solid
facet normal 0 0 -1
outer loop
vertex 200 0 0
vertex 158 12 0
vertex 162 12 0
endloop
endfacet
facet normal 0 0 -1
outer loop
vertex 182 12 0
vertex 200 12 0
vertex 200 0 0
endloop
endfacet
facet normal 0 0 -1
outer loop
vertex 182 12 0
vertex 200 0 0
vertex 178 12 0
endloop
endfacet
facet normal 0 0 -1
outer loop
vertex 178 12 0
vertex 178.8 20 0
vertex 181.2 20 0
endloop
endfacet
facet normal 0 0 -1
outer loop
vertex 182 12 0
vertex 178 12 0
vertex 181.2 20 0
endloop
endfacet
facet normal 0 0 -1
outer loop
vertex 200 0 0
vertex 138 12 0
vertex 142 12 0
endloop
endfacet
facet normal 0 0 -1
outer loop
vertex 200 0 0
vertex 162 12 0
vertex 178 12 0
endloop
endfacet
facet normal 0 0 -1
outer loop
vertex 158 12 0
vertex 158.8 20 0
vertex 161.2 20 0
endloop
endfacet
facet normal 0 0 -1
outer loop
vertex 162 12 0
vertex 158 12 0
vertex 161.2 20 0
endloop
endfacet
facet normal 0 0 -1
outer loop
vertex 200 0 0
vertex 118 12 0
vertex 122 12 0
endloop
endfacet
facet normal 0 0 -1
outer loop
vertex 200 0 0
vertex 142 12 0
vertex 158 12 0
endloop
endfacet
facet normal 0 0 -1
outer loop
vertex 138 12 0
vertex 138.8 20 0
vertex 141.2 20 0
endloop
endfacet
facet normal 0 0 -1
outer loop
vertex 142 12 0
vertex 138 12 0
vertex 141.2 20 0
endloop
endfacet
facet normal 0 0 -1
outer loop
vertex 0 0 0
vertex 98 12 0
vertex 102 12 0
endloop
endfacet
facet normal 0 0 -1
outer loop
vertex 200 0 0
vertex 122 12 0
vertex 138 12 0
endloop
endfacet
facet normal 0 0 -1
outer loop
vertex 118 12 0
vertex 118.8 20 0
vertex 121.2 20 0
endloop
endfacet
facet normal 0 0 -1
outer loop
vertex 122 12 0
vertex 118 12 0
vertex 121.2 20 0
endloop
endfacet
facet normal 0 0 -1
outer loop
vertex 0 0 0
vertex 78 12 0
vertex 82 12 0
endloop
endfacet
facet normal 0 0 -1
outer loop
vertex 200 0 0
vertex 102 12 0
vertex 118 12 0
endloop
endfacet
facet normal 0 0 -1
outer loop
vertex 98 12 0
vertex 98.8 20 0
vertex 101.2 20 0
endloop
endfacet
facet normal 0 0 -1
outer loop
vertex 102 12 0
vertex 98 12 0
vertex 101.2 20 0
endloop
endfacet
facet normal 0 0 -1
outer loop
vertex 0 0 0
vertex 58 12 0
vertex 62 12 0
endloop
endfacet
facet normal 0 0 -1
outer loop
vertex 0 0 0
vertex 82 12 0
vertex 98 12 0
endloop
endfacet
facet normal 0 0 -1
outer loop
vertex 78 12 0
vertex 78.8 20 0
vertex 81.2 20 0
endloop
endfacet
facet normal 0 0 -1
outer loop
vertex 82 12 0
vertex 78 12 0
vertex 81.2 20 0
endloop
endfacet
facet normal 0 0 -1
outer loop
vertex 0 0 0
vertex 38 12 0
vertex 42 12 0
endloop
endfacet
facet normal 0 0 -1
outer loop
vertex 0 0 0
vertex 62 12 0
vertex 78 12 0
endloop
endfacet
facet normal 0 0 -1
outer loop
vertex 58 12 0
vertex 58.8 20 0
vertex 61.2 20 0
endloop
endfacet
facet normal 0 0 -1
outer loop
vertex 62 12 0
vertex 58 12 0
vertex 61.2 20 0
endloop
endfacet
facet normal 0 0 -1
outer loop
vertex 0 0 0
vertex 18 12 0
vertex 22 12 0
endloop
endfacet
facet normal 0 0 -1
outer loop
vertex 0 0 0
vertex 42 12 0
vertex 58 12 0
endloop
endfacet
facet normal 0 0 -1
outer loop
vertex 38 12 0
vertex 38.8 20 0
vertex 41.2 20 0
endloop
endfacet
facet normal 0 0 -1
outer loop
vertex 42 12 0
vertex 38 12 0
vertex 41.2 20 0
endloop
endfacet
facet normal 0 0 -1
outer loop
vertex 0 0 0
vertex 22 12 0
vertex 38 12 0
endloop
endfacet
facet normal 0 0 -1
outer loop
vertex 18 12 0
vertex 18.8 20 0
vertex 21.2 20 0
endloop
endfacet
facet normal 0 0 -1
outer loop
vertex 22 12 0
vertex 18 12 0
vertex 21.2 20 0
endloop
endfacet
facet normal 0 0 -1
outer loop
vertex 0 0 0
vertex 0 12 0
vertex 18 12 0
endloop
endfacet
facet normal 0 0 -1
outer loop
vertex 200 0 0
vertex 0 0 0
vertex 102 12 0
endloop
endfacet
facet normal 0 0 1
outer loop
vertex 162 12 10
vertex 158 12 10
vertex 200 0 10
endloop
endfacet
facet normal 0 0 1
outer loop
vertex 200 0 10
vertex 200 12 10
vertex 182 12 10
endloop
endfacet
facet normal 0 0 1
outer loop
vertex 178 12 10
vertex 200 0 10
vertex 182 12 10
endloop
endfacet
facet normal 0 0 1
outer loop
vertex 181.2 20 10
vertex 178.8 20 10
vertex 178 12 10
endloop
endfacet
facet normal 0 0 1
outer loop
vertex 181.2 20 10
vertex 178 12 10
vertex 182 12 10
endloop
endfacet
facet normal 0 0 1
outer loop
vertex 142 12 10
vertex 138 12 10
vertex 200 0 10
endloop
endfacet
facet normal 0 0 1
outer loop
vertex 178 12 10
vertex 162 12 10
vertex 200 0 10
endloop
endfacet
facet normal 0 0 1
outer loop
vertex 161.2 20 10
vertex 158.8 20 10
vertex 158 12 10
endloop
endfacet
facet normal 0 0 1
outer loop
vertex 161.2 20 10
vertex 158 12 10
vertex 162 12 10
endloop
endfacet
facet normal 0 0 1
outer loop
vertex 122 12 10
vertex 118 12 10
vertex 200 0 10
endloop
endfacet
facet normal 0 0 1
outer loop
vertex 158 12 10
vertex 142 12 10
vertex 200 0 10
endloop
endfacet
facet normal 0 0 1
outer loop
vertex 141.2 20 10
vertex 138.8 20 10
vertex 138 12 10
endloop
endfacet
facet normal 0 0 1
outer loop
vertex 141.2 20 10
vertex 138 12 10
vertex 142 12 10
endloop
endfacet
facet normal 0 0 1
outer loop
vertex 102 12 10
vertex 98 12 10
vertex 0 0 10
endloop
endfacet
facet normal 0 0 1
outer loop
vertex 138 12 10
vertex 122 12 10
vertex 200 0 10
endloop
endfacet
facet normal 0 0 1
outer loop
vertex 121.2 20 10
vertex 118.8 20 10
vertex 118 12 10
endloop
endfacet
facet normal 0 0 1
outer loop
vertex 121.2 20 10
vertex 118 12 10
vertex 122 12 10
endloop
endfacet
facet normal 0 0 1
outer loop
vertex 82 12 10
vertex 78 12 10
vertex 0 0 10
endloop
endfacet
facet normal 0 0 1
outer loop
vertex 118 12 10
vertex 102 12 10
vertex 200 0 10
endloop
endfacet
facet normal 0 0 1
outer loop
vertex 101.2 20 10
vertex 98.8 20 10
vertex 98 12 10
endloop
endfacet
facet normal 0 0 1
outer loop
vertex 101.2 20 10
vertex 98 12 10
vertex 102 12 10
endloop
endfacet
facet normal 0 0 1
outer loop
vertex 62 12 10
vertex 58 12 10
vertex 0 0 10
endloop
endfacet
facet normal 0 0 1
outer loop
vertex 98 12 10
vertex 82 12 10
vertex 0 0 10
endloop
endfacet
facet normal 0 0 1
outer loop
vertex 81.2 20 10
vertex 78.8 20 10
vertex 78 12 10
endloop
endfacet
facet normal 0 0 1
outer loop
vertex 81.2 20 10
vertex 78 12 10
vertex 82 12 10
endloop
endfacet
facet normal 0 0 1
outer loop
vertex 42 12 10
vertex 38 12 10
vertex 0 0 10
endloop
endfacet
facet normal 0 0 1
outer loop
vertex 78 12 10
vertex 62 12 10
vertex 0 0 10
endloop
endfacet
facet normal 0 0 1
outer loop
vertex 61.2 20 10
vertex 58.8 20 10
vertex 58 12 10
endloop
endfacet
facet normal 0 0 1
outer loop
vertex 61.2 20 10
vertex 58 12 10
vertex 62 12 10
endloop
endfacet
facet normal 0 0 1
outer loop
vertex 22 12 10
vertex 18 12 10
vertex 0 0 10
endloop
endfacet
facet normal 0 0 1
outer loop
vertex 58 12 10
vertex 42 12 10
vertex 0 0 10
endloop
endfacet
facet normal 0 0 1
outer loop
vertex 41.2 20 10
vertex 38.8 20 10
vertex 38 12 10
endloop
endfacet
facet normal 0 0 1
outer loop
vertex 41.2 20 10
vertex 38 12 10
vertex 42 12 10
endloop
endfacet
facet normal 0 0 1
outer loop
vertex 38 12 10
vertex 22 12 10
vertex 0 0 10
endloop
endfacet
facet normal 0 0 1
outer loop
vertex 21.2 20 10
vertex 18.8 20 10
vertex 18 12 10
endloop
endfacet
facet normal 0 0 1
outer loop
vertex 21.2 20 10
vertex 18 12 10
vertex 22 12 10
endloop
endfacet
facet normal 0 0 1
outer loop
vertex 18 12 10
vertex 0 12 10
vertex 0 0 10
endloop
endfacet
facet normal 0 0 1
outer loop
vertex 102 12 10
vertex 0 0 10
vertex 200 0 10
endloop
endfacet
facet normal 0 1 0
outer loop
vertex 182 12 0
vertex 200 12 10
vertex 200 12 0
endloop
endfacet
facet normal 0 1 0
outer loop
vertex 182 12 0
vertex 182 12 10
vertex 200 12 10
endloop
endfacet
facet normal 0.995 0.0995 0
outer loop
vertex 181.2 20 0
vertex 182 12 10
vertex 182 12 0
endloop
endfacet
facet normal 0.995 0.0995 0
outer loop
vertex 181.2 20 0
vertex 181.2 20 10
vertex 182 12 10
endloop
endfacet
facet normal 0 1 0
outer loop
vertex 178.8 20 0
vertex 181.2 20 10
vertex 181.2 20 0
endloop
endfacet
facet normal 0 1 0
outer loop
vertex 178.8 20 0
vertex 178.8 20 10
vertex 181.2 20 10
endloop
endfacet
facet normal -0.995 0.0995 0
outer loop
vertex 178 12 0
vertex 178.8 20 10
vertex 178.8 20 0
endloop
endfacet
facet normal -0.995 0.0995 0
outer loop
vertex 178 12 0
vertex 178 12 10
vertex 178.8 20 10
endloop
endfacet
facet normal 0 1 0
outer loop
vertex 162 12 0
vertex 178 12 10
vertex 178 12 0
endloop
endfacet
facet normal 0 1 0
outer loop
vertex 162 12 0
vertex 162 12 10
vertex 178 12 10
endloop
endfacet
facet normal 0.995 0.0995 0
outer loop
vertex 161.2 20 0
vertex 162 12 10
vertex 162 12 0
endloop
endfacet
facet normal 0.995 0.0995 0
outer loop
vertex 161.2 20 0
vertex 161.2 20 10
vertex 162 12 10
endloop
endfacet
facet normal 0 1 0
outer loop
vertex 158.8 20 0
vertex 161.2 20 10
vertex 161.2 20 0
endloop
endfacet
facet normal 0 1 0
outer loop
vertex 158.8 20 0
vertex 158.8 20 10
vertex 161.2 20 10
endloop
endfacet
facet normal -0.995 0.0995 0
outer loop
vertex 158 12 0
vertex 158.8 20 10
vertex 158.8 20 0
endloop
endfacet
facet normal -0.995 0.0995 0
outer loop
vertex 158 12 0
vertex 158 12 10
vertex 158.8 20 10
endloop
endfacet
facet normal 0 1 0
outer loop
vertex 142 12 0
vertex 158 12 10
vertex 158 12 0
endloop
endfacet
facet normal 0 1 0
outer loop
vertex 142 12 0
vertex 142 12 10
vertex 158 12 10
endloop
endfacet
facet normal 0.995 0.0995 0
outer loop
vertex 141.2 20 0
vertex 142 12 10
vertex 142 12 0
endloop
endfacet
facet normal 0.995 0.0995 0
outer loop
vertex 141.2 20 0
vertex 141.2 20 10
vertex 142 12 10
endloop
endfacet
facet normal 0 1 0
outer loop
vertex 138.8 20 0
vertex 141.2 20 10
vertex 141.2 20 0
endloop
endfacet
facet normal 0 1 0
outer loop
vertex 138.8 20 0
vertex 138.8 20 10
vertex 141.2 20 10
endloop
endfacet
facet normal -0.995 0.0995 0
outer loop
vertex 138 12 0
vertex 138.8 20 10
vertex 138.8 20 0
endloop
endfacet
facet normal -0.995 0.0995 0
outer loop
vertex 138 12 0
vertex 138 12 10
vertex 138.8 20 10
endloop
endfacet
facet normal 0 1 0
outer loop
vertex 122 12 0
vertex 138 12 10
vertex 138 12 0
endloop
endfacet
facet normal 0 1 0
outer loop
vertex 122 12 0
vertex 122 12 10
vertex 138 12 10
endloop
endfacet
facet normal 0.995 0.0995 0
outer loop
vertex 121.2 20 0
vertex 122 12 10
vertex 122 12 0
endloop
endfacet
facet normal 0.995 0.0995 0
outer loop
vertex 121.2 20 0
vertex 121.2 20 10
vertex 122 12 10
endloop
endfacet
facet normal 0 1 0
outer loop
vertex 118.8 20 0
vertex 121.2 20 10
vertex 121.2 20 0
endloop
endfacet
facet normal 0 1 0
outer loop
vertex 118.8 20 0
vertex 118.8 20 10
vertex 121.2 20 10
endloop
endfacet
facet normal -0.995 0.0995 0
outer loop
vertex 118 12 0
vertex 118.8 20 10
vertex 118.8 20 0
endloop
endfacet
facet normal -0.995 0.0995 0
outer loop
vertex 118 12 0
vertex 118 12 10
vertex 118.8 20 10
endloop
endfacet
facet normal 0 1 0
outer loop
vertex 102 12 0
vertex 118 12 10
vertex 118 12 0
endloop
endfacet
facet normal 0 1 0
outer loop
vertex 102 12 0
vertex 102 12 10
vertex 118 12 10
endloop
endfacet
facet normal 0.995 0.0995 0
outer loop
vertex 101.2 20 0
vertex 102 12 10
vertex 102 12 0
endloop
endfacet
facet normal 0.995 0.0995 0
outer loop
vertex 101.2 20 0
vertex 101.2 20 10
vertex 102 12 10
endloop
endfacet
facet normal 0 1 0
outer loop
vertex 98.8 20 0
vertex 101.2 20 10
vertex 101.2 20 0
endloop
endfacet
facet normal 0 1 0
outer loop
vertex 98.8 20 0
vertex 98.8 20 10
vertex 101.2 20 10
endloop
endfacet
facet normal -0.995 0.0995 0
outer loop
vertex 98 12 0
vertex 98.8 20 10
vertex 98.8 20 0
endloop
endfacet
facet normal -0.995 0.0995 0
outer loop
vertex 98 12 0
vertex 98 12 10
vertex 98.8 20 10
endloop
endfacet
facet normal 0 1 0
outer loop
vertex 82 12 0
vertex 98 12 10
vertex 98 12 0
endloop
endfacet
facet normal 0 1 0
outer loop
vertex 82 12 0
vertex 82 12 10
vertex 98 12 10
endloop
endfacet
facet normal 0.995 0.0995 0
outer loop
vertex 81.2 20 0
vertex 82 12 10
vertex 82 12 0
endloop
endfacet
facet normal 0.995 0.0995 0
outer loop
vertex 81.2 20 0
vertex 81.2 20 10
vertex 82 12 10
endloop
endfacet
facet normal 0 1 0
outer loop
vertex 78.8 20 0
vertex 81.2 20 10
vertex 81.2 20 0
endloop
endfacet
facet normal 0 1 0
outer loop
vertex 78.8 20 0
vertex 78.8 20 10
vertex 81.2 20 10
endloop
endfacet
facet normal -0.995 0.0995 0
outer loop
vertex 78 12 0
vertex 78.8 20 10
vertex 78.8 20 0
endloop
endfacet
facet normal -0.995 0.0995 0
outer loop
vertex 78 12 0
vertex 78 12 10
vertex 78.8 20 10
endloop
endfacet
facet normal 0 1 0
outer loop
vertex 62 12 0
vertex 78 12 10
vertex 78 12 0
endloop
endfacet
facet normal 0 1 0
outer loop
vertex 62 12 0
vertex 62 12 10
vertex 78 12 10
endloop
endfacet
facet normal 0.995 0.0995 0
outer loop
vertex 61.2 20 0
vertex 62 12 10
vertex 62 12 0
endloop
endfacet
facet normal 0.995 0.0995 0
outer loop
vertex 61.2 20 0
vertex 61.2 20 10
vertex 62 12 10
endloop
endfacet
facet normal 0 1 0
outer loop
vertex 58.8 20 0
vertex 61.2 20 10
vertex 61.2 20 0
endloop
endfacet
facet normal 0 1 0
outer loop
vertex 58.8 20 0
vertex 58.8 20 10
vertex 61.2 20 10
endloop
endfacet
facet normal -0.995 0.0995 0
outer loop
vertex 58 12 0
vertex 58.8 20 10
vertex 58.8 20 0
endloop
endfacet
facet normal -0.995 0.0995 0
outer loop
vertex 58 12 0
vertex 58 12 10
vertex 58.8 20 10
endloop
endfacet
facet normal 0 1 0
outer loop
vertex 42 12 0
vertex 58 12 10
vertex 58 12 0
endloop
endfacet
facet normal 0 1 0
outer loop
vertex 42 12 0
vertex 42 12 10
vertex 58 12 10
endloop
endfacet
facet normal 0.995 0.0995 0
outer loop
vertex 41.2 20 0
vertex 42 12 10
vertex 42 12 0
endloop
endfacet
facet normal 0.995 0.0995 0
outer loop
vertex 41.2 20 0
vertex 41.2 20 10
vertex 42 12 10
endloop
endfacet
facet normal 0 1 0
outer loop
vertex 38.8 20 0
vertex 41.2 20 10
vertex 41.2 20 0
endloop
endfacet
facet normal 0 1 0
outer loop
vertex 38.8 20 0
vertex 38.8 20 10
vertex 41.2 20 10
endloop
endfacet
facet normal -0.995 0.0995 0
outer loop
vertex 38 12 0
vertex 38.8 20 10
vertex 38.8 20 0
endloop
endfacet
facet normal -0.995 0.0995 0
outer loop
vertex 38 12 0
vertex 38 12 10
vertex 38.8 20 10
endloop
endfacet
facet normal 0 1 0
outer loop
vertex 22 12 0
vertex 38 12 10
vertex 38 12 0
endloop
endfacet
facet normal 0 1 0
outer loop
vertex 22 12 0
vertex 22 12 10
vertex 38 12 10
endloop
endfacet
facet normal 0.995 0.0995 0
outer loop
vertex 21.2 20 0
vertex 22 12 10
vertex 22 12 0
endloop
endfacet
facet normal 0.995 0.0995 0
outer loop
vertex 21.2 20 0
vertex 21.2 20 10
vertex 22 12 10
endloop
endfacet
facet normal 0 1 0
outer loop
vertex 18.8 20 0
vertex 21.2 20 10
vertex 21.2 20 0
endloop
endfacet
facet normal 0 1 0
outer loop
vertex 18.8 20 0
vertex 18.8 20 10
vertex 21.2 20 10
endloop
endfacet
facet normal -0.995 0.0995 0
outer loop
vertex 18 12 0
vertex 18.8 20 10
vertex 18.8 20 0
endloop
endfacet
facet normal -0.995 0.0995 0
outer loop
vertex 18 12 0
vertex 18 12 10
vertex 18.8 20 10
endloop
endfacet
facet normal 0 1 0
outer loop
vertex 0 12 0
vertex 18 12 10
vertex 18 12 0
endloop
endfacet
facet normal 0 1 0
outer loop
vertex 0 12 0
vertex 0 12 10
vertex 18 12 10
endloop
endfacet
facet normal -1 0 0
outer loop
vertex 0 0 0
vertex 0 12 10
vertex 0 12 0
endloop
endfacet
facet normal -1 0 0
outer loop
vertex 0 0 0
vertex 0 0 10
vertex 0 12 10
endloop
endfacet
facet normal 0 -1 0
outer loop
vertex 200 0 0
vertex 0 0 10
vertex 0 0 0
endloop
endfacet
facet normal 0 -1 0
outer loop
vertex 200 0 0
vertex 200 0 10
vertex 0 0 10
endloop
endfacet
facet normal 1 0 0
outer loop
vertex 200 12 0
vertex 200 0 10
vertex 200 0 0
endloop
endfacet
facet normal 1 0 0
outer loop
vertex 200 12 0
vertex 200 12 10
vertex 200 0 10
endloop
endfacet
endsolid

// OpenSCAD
$fn = 32;

// ----------------------------------------------------------------------
// Gear rack: 9 teeth on a 200 mm bar, pitch 20 mm
// ----------------------------------------------------------------------

// --- parameters (mm) ---
profile_height = 10;      // extrusion height
profile_points = 40;      // points of the closed outline

profile = [[0, 0], [200, 0], [200, 12], [182, 12], [181.2, 20], [178.8, 20], [178, 12], [162, 12], [161.2, 20], [158.8, 20], [158, 12], [142, 12], [141.2, 20], [138.8, 20], [138, 12], [122, 12], [121.2, 20], [118.8, 20], [118, 12], [102, 12], [101.2, 20], [98.8, 20], [98, 12], [82, 12], [81.2, 20], [78.8, 20], [78, 12], [62, 12], [61.2, 20], [58.8, 20], [58, 12], [42, 12], [41.2, 20], [38.8, 20], [38, 12], [22, 12], [21.2, 20], [18.8, 20], [18, 12], [0, 12]];  // single closed polygon, 40 points, counter clockwise

// --- the one profile operation ---
linear_extrude(height = profile_height) polygon(points = profile);
